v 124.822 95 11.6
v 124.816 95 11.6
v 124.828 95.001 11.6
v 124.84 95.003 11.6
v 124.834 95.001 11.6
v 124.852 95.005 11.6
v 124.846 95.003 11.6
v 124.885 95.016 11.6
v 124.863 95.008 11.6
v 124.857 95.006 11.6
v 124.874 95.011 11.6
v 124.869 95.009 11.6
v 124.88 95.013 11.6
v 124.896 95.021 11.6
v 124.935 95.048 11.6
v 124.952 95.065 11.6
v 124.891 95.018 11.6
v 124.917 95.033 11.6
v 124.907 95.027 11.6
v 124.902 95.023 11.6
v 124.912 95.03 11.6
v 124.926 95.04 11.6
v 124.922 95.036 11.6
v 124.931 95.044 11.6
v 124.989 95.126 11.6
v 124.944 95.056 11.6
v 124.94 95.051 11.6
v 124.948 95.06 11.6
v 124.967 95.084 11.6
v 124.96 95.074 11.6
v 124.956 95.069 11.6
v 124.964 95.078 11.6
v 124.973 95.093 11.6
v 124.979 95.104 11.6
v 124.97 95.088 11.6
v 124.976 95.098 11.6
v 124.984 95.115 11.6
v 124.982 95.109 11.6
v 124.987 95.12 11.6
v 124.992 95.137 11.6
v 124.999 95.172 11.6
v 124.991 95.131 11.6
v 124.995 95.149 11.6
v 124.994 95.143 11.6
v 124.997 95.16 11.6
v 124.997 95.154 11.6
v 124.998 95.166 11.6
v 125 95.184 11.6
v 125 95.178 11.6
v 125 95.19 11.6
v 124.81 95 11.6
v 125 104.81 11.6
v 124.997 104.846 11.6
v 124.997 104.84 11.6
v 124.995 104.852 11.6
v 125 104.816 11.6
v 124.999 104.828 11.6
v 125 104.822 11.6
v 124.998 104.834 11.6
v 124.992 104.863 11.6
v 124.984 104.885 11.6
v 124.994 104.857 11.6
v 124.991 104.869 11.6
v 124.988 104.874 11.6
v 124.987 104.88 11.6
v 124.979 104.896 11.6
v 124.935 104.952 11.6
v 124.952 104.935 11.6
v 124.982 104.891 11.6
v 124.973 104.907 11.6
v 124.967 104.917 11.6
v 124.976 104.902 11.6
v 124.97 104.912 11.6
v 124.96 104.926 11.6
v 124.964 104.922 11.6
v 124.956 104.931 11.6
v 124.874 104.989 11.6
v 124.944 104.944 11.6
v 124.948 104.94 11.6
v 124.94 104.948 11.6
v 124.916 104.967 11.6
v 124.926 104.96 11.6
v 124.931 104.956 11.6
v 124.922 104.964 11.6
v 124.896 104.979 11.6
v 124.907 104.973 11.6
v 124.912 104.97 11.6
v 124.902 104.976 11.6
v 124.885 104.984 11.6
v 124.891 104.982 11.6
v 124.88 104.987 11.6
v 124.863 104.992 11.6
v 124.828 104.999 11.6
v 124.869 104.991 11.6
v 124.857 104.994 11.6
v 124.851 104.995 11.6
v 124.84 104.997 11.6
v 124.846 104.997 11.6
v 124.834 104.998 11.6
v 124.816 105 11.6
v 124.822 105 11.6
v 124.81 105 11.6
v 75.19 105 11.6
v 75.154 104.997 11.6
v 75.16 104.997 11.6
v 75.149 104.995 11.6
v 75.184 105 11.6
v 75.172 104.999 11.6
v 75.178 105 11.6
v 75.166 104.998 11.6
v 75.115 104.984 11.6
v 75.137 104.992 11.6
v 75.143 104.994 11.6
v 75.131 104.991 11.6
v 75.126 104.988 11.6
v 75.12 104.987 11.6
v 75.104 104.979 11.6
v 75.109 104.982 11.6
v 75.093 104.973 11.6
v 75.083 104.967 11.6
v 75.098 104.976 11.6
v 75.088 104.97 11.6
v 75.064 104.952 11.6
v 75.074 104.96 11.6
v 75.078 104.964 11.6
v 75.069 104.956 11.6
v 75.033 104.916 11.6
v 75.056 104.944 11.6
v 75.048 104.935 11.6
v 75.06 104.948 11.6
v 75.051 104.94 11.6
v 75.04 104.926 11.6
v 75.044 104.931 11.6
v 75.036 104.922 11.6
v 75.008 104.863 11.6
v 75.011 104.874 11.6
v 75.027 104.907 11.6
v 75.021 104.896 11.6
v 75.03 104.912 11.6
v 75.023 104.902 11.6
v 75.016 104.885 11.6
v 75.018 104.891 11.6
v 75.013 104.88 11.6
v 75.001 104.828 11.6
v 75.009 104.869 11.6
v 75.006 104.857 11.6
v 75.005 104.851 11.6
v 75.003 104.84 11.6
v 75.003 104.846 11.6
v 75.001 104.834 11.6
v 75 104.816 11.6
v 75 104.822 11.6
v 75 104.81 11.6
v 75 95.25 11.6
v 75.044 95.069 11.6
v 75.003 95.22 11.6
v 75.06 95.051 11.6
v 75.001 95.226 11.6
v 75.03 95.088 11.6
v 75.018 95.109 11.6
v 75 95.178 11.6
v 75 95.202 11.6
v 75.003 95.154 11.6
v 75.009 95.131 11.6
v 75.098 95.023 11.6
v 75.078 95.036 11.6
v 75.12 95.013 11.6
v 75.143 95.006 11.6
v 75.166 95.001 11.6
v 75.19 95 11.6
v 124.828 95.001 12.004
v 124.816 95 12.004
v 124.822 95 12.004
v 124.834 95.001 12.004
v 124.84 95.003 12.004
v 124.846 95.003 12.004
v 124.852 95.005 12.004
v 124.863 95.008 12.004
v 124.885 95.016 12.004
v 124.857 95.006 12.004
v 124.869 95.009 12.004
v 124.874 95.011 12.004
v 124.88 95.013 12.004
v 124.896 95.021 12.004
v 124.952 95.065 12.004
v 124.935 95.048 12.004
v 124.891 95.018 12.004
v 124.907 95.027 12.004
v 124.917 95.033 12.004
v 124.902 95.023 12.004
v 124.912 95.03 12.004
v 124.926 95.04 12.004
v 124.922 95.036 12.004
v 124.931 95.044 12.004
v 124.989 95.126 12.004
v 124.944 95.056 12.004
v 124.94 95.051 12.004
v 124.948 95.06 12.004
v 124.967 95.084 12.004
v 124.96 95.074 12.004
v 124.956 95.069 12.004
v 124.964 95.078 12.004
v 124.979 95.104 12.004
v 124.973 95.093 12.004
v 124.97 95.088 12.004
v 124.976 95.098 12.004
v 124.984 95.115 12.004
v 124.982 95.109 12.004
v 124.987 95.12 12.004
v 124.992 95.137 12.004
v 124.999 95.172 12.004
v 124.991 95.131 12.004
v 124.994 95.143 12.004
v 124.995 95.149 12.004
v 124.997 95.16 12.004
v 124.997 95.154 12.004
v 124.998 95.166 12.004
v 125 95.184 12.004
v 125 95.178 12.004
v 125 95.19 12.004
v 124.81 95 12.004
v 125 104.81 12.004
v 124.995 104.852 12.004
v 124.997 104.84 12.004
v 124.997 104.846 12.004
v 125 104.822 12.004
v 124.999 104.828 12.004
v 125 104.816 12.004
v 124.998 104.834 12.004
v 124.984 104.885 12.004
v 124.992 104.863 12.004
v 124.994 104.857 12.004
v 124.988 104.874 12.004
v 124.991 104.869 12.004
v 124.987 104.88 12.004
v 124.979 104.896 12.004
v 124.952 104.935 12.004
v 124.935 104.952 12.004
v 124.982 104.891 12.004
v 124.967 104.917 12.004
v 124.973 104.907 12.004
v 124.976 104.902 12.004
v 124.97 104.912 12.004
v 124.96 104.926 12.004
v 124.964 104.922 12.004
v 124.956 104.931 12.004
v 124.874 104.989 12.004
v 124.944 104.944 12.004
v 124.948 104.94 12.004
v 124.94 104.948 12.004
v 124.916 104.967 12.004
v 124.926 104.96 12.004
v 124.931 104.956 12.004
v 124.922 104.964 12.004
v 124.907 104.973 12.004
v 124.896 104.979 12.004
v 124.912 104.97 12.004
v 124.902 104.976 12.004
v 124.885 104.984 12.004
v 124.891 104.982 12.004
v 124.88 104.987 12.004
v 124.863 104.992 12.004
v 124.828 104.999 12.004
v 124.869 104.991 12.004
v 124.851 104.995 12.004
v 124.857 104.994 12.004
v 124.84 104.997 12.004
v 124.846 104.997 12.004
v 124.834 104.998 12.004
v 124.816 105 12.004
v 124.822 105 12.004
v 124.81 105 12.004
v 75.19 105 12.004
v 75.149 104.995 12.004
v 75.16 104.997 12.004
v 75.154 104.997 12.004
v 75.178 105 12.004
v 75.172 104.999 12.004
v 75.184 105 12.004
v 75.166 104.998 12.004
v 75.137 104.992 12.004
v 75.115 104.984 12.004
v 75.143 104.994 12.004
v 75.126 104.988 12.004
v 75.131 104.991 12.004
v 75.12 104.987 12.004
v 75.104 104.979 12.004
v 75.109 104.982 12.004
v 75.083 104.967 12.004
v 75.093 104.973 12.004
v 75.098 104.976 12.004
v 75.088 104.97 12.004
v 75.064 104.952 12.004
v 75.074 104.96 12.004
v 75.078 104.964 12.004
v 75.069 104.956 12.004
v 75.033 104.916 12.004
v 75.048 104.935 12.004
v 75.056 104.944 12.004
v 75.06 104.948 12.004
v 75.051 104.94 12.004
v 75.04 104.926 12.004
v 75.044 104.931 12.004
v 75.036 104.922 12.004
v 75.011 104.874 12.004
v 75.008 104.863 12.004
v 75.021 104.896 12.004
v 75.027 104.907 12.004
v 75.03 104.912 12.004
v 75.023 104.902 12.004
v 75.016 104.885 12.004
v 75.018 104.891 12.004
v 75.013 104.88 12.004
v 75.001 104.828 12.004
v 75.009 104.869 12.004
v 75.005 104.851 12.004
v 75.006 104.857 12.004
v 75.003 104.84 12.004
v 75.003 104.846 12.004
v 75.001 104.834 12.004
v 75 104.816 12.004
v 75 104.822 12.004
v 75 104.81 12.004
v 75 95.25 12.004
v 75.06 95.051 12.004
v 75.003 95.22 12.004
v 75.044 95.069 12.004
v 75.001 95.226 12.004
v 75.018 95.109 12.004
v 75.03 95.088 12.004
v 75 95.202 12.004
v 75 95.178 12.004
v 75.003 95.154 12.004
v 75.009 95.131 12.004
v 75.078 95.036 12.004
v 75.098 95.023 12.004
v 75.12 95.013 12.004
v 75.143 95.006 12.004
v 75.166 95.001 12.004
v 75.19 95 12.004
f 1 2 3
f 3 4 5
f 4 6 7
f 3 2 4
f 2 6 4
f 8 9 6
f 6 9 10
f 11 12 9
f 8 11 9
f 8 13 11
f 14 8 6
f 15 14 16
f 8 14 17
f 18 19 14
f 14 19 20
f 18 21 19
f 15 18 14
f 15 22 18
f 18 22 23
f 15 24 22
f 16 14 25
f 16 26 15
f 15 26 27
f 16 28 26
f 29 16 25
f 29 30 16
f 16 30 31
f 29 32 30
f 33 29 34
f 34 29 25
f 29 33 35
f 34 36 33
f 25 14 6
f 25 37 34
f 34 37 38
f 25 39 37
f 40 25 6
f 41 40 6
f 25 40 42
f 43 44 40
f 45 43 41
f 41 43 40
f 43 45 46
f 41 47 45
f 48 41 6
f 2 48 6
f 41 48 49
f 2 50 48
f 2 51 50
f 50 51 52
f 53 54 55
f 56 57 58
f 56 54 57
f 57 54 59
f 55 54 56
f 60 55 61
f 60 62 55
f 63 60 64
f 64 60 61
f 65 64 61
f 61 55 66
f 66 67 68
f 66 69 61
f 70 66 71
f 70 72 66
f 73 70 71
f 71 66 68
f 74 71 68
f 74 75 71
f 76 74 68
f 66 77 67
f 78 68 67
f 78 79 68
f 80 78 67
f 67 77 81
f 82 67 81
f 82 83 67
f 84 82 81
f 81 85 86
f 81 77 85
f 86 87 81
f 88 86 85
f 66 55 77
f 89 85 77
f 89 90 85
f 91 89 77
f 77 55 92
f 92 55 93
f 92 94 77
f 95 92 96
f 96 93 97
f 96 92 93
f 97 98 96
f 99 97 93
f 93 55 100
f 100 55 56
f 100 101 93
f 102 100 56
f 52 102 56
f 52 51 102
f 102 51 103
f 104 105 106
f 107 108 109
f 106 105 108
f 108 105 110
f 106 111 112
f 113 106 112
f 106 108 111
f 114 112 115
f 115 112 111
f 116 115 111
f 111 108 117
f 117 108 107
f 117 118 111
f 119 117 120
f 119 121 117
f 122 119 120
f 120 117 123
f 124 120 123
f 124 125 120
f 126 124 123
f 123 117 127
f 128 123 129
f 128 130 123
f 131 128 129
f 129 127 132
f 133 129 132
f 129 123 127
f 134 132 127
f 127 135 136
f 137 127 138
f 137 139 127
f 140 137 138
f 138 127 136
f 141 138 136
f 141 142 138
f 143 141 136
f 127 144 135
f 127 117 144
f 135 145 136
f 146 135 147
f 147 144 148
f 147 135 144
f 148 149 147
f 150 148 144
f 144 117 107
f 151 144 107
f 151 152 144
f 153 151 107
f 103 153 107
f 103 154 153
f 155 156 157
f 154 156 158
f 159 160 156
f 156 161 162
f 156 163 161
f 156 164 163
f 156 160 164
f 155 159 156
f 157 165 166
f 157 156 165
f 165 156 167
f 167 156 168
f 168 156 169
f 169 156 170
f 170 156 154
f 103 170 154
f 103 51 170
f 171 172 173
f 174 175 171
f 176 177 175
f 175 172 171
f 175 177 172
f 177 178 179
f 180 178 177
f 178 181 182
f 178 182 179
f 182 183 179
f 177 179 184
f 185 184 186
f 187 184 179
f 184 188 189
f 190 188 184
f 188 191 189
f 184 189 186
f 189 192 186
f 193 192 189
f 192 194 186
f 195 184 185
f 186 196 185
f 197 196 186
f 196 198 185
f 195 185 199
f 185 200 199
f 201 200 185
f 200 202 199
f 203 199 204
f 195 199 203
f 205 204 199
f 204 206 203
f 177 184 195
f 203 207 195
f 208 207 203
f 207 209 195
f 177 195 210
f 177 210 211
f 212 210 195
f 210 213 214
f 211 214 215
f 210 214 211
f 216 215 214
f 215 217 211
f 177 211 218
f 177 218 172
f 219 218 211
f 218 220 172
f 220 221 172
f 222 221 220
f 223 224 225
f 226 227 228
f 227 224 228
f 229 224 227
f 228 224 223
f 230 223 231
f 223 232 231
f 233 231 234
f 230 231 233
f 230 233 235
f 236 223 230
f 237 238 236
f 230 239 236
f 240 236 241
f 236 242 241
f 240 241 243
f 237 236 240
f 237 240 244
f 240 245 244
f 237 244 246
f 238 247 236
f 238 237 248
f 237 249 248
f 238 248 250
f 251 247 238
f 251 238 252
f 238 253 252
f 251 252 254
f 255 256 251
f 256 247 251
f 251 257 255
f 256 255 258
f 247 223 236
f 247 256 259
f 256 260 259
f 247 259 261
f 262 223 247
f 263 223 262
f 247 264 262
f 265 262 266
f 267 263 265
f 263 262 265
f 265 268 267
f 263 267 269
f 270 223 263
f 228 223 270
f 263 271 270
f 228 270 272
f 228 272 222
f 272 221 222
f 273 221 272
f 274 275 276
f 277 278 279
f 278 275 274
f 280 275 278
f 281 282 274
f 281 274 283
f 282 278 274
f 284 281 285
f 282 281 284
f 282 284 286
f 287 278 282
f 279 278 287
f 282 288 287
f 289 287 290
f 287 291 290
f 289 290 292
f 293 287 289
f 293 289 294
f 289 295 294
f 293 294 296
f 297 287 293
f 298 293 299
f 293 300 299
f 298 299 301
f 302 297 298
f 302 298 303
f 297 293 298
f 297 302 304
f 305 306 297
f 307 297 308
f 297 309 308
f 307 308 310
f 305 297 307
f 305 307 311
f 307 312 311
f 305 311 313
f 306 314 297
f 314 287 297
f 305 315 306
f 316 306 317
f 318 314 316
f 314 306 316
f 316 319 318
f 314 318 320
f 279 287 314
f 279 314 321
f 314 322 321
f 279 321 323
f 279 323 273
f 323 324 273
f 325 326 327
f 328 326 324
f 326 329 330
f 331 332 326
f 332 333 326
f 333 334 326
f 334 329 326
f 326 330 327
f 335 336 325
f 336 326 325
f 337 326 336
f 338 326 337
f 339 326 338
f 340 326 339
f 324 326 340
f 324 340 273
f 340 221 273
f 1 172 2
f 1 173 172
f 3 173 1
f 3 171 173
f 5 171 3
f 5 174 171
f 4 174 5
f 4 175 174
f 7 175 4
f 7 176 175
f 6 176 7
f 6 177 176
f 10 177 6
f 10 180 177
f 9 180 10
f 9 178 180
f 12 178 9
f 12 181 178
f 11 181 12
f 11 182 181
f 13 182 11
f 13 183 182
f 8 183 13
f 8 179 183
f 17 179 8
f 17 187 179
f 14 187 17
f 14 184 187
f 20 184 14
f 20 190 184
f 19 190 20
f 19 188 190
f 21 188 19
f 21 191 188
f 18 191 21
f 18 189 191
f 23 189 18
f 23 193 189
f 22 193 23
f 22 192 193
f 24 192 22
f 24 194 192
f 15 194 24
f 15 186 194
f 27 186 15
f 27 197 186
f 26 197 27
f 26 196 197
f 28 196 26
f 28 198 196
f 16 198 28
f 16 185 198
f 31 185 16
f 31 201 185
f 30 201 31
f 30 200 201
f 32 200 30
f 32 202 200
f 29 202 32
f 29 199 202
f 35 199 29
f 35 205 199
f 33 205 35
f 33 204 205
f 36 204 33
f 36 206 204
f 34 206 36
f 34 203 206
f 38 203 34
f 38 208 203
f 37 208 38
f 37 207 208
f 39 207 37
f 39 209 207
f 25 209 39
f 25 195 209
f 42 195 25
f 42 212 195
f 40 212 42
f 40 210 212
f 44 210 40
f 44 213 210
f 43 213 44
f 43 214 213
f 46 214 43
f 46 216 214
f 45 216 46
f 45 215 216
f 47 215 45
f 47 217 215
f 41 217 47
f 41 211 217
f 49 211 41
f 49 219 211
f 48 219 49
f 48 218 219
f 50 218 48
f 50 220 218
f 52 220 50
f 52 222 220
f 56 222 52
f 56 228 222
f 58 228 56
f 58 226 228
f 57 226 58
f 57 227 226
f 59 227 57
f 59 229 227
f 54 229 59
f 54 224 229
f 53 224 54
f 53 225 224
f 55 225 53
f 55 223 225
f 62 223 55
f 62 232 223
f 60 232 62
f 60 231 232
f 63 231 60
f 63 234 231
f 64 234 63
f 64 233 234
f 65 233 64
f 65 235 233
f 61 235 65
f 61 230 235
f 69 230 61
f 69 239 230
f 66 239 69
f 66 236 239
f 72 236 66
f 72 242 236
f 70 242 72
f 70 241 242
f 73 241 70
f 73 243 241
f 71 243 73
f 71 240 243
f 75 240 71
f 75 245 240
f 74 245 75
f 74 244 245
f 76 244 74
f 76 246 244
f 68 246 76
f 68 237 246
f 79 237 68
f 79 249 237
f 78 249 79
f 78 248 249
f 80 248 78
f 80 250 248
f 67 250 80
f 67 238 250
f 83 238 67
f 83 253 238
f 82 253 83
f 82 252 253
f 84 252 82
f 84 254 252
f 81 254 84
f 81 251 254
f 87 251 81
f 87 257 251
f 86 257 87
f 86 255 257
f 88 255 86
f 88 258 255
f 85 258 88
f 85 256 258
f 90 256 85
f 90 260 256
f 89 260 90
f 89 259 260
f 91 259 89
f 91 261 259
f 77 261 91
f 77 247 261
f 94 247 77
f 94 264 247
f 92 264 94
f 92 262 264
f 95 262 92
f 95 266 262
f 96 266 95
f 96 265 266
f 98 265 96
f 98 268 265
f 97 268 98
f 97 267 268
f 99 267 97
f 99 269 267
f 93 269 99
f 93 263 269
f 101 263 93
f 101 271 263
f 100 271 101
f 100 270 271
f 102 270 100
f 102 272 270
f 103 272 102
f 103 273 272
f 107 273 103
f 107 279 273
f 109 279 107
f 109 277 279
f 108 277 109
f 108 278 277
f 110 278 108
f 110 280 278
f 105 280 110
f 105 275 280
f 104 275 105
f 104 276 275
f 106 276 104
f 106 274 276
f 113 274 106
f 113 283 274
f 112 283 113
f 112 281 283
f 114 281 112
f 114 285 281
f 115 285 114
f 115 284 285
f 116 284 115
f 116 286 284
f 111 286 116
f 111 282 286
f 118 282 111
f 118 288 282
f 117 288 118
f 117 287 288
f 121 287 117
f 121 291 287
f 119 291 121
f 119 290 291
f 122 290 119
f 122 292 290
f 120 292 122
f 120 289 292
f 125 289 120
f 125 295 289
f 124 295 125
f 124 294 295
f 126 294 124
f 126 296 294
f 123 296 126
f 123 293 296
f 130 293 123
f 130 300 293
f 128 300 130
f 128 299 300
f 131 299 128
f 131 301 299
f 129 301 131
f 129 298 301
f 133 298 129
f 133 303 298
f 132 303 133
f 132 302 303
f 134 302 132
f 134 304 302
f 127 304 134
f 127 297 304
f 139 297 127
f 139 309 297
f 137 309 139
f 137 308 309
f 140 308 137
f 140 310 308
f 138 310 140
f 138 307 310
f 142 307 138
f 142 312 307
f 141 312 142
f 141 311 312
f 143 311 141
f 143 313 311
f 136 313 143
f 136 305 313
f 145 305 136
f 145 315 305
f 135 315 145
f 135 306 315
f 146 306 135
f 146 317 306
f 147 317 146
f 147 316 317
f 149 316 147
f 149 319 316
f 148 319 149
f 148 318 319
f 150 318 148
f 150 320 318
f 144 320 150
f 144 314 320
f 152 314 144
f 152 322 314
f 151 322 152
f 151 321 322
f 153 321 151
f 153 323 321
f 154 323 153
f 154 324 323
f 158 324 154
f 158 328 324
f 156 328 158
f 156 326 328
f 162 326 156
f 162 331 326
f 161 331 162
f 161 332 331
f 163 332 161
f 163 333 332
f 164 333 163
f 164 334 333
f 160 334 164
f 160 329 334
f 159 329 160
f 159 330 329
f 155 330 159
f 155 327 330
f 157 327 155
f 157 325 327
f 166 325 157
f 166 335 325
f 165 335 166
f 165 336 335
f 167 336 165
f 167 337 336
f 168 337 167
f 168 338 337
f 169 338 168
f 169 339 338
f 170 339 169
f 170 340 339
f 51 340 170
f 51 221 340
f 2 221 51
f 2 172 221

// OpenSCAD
module drawBasicShape(x1, y1, x2, y2, width)
{
	length = sqrt((x1-x2)*(x1-x2) + (y1-y2)*(y1-y2));
	if (width!=0.0) {
		square(size = [width, length], center = false);
		translate([width/2.0, 0, 0]) circle(d=width);
		translate([width/2.0, length, 0]) circle(d=width);
	}
}

module translateAndRotate(x1, y1, x2, y2, width)
{
	if (width != 0.0) {
		angle = atan((y2-y1)/(x2-x1)) +270;
		if (x2>=x1) {
			translate([x1, y1, 0.0]) rotate([0.0, 0.0, angle]) translate([-width/2.0, 0.0, 0.0]) scale([1.0, 1.0, 1.0]) drawBasicShape(x1, y1, x2, y2, width);
		}
		else {
			translate([x1, y1, 0.0]) rotate([0.0, 0.0, angle+180]) translate([-width/2.0, 0.0, 0.0]) scale([1.0, 1.0, 1.0]) drawBasicShape(x1, y1, x2, y2, width);		}
	}
}

$fn=50;

points28 = [
[75.77800000, 95.77800000, 0.00000000],
[124.22200000, 95.77800000, 0.37999672],
[124.22200000, 104.22200000, 0.37997788],
[75.77800000, 104.22200000, 0.37999548],
[75.77800000, 95.83800000, 0.37998140],
[75.48400000, 95.48400000, 0.00000000],
[124.51600000, 95.48400000, 0.37999746],
[124.51600000, 104.51600000, 0.37998977],
[75.48400000, 104.51600000, 0.37999868],
[75.48400000, 95.54400000, 0.37998644],
[75.19000000, 95.19000000, 0.00000000],
[124.81000000, 95.19000000, 0.38000060],
[124.81000000, 104.81000000, 0.38000021],
[75.19000000, 104.81000000, 0.37999939],
[75.19000000, 95.25000000, 0.37999715],
[75.53600000, 95.39000000, 0.00000000],
[75.94600000, 103.88900000, 0.00000000],
[76.11100000, 104.05400000, 0.37961375],
[76.52800000, 104.05400000, 0.38015610],
[75.94600000, 103.47200000, 0.37989934],
[75.94600000, 103.05500000, 0.38001190],
[76.94500000, 104.05400000, 0.37994651],
[77.36200000, 104.05400000, 0.38001190],
[75.94600000, 102.63800000, 0.37999592],
[75.94600000, 102.22100000, 0.38001190],
[77.77900000, 104.05400000, 0.38002285],
[78.19600000, 104.05400000, 0.38001190],
[75.94600000, 101.80400000, 0.38000201],
[75.94600000, 101.38700000, 0.38001190],
[78.61300000, 104.05400000, 0.38001957],
[79.03000000, 104.05400000, 0.38001190],
[75.94600000, 100.97000000, 0.38001859],
[75.94600000, 100.55300000, 0.38015610],
[79.44700000, 104.05400000, 0.38001785],
[79.86400000, 104.05400000, 0.38001190],
[75.94600000, 100.13600000, 0.38002811],
[75.94600000, 99.71900000, 0.38001190],
[80.28100000, 104.05400000, 0.38002660],
[80.69800000, 104.05400000, 0.38015610],
[75.94600000, 99.30200000, 0.38002534],
[75.94600000, 98.88500000, 0.38001190],
[81.11500000, 104.05400000, 0.38003252],
[81.53300000, 104.05400000, 0.37930814],
[75.94600000, 98.46700000, 0.37997836],
[75.94600000, 98.05000000, 0.38001190],
[81.95000000, 104.05400000, 0.37998780],
[82.36700000, 104.05400000, 0.38001190],
[75.94600000, 97.63300000, 0.37998939],
[75.94600000, 97.21600000, 0.38001190],
[82.78400000, 104.05400000, 0.37999079],
[83.20100000, 104.05400000, 0.38001190],
[75.94600000, 96.79900000, 0.37999203],
[75.94600000, 96.38200000, 0.38015610],
[83.61800000, 104.05400000, 0.37999314],
[84.03500000, 104.05400000, 0.38015610],
[75.95600000, 95.97600000, 0.37999749],
[76.34400000, 95.94600000, 0.37973456],
[84.45200000, 104.05400000, 0.38000229],
[84.86900000, 104.05400000, 0.38001190],
[76.76100000, 95.94600000, 0.38000229],
[77.17800000, 95.94600000, 0.38015610],
[85.28600000, 104.05400000, 0.38000229],
[85.70300000, 104.05400000, 0.38001190],
[77.59500000, 95.94600000, 0.38000754],
[78.01200000, 95.94600000, 0.38001190],
[86.12000000, 104.05400000, 0.38000229],
[86.53700000, 104.05400000, 0.38001190],
[78.42900000, 95.94600000, 0.38000754],
[78.84600000, 95.94600000, 0.38001190],
[86.95400000, 104.05400000, 0.38000229],
[87.37100000, 104.05400000, 0.38015610],
[79.26300000, 95.94600000, 0.38000229],
[79.68000000, 95.94600000, 0.38001190],
[87.78900000, 104.05400000, 0.37998940],
[88.20600000, 104.05400000, 0.38001190],
[80.09700000, 95.94600000, 0.37998415],
[80.51500000, 95.94600000, 0.37930814],
[88.62300000, 104.05400000, 0.38000754],
[89.04000000, 104.05400000, 0.38001190],
[80.93200000, 95.94600000, 0.38000229],
[81.34900000, 95.94600000, 0.38015610],
[89.45700000, 104.05400000, 0.38000229],
[89.87400000, 104.05400000, 0.38001190],
[81.76600000, 95.94600000, 0.38000754],
[82.18300000, 95.94600000, 0.38001190],
[90.29100000, 104.05400000, 0.38000229],
[90.70800000, 104.05400000, 0.38001190],
[82.60000000, 95.94600000, 0.38000754],
[83.01700000, 95.94600000, 0.38001190],
[91.12500000, 104.05400000, 0.38000229],
[91.54200000, 104.05400000, 0.38015610],
[83.43400000, 95.94600000, 0.38000229],
[83.85100000, 95.94600000, 0.38001190],
[91.95900000, 104.05400000, 0.38000754],
[92.37600000, 104.05400000, 0.38001190],
[84.26800000, 95.94600000, 0.38000229],
[84.68500000, 95.94600000, 0.38001190],
[92.79300000, 104.05400000, 0.38000754],
[93.21000000, 104.05400000, 0.38001190],
[85.10200000, 95.94600000, 0.38000229],
[85.51900000, 95.94600000, 0.38015610],
[93.62700000, 104.05400000, 0.38000229],
[94.04400000, 104.05400000, 0.38001190],
[85.93600000, 95.94600000, 0.38000754],
[86.35300000, 95.94600000, 0.38001190],
[94.46200000, 104.05400000, 0.37998415],
[94.87900000, 104.05400000, 0.38001190],
[86.77000000, 95.94600000, 0.37998940],
[87.18800000, 95.94600000, 0.37930814],
[95.29600000, 104.05400000, 0.38000229],
[95.71300000, 104.05400000, 0.38015610],
[87.60500000, 95.94600000, 0.38000229],
[88.02200000, 95.94600000, 0.38001190],
[96.13000000, 104.05400000, 0.38000754],
[96.54700000, 104.05400000, 0.38001190],
[88.43900000, 95.94600000, 0.38000229],
[88.85600000, 95.94600000, 0.38001190],
[96.96400000, 104.05400000, 0.38000754],
[97.38100000, 104.05400000, 0.38001190],
[89.27300000, 95.94600000, 0.38000229],
[89.69000000, 95.94600000, 0.38015610],
[97.79800000, 104.05400000, 0.38000229],
[98.21500000, 104.05400000, 0.38001190],
[90.10700000, 95.94600000, 0.38000754],
[90.52400000, 95.94600000, 0.38001190],
[98.63200000, 104.05400000, 0.38000229],
[99.04900000, 104.05400000, 0.38001190],
[90.94100000, 95.94600000, 0.38000754],
[91.35800000, 95.94600000, 0.38001190],
[99.46600000, 104.05400000, 0.38000229],
[99.88300000, 104.05400000, 0.38015610],
[91.77500000, 95.94600000, 0.38000229],
[92.19200000, 95.94600000, 0.38001190],
[100.30000000, 104.05400000, 0.38000754],
[100.71800000, 104.05400000, 0.37930814],
[92.60900000, 95.94600000, 0.37998415],
[93.02600000, 95.94600000, 0.38001190],
[101.13500000, 104.05400000, 0.37998940],
[101.55200000, 104.05400000, 0.38001190],
[93.44400000, 95.94600000, 0.38000229],
[93.86100000, 95.94600000, 0.38015610],
[101.96900000, 104.05400000, 0.38000229],
[102.38600000, 104.05400000, 0.38001190],
[94.27800000, 95.94600000, 0.38000229],
[94.69500000, 95.94600000, 0.38015610],
[102.80300000, 104.05400000, 0.38000229],
[103.22000000, 104.05400000, 0.38001190],
[95.11200000, 95.94600000, 0.38000754],
[95.52900000, 95.94600000, 0.38001190],
[103.63700000, 104.05400000, 0.38000229],
[104.05400000, 104.05400000, 0.38001190],
[95.94600000, 95.94600000, 0.38000754],
[96.36300000, 95.94600000, 0.38001190],
[104.47100000, 104.05400000, 0.38000229],
[104.88800000, 104.05400000, 0.38015610],
[96.78000000, 95.94600000, 0.38000229],
[97.19700000, 95.94600000, 0.38001190],
[105.30500000, 104.05400000, 0.38000754],
[105.72200000, 104.05400000, 0.38001190],
[97.61400000, 95.94600000, 0.38000229],
[98.03100000, 95.94600000, 0.38001190],
[106.13900000, 104.05400000, 0.38000754],
[106.55600000, 104.05400000, 0.38001190],
[98.44800000, 95.94600000, 0.38000229],
[98.86500000, 95.94600000, 0.38015610],
[106.97300000, 104.05400000, 0.38000229],
[107.39100000, 104.05400000, 0.37930814],
[99.28200000, 95.94600000, 0.37998940],
[99.69900000, 95.94600000, 0.38001190],
[107.80800000, 104.05400000, 0.37998415],
[108.22500000, 104.05400000, 0.38001190],
[100.11700000, 95.94600000, 0.38000754],
[100.53400000, 95.94600000, 0.38001190],
[108.64200000, 104.05400000, 0.38000229],
[109.05900000, 104.05400000, 0.38015610],
[100.95100000, 95.94600000, 0.38000229],
[101.36800000, 95.94600000, 0.38001190],
[109.47600000, 104.05400000, 0.38000754],
[109.89300000, 104.05400000, 0.38001190],
[101.78500000, 95.94600000, 0.38000229],
[102.20200000, 95.94600000, 0.38001190],
[110.31000000, 104.05400000, 0.38000754],
[110.72700000, 104.05400000, 0.38001190],
[102.61900000, 95.94600000, 0.38000229],
[103.03600000, 95.94600000, 0.38015610],
[111.14400000, 104.05400000, 0.38000229],
[111.56100000, 104.05400000, 0.38001190],
[103.45300000, 95.94600000, 0.38000754],
[103.87000000, 95.94600000, 0.38001190],
[111.97800000, 104.05400000, 0.38000229],
[112.39500000, 104.05400000, 0.38001190],
[104.28700000, 95.94600000, 0.38000754],
[104.70400000, 95.94600000, 0.38001190],
[112.81200000, 104.05400000, 0.38000229],
[113.22900000, 104.05400000, 0.38015610],
[105.12100000, 95.94600000, 0.38000229],
[105.53800000, 95.94600000, 0.38001190],
[113.64700000, 104.05400000, 0.37998415],
[114.06400000, 104.05400000, 0.38015610],
[105.95500000, 95.94600000, 0.37998415],
[106.37300000, 95.94600000, 0.37930814],
[114.48100000, 104.05400000, 0.38000754],
[114.89800000, 104.05400000, 0.38001190],
[106.79000000, 95.94600000, 0.38000229],
[107.20700000, 95.94600000, 0.38015610],
[115.31500000, 104.05400000, 0.38000229],
[115.73200000, 104.05400000, 0.38001190],
[107.62400000, 95.94600000, 0.38000229],
[108.04100000, 95.94600000, 0.38015610],
[116.14900000, 104.05400000, 0.38000229],
[116.56600000, 104.05400000, 0.38001190],
[108.45800000, 95.94600000, 0.38000754],
[108.87500000, 95.94600000, 0.38001190],
[116.98300000, 104.05400000, 0.38000229],
[117.40000000, 104.05400000, 0.38001190],
[109.29200000, 95.94600000, 0.38000754],
[109.70900000, 95.94600000, 0.38001190],
[117.81700000, 104.05400000, 0.38000229],
[118.23400000, 104.05400000, 0.38015610],
[110.12600000, 95.94600000, 0.38000229],
[110.54300000, 95.94600000, 0.38001190],
[118.65100000, 104.05400000, 0.38000754],
[119.06800000, 104.05400000, 0.38001190],
[110.96000000, 95.94600000, 0.38000229],
[111.37700000, 95.94600000, 0.38001190],
[119.48500000, 104.05400000, 0.38000754],
[119.90200000, 104.05400000, 0.38001190],
[111.79400000, 95.94600000, 0.38000229],
[112.21100000, 95.94600000, 0.38015610],
[120.32000000, 104.05400000, 0.37998415],
[120.73700000, 104.05400000, 0.38001190],
[112.62900000, 95.94600000, 0.38000754],
[113.04600000, 95.94600000, 0.38001190],
[121.15400000, 104.05400000, 0.38000229],
[121.57100000, 104.05400000, 0.38001190],
[113.46300000, 95.94600000, 0.38000754],
[113.88000000, 95.94600000, 0.38001190],
[121.98800000, 104.05400000, 0.38000229],
[122.40500000, 104.05400000, 0.38015610],
[114.29700000, 95.94600000, 0.38000229],
[114.71400000, 95.94600000, 0.38001190],
[122.82200000, 104.05400000, 0.38000229],
[123.23900000, 104.05400000, 0.38015610],
[115.13100000, 95.94600000, 0.38000229],
[115.54800000, 95.94600000, 0.38001190],
[123.65600000, 104.05400000, 0.38000754],
[124.04400000, 104.02500000, 0.37963728],
[115.96500000, 95.94600000, 0.37998455],
[116.38200000, 95.94600000, 0.38001190],
[124.05400000, 103.61800000, 0.37999868],
[124.05400000, 103.20100000, 0.38001190],
[116.79900000, 95.94600000, 0.37999789],
[117.21600000, 95.94600000, 0.38001190],
[124.05400000, 102.78400000, 0.37999701],
[124.05400000, 102.36700000, 0.38001190],
[117.63300000, 95.94600000, 0.37998939],
[118.05000000, 95.94600000, 0.38001190],
[124.05400000, 101.95000000, 0.37998780],
[124.05400000, 101.53300000, 0.38001190],
[118.46700000, 95.94600000, 0.37997836],
[118.88400000, 95.94600000, 0.38015610],
[124.05400000, 101.11600000, 0.37997562],
[124.05400000, 100.69800000, 0.37930814],
[119.30200000, 95.94600000, 0.38003429],
[119.71900000, 95.94600000, 0.38001190],
[124.05400000, 100.28100000, 0.38002660],
[124.05400000, 99.86400000, 0.38015610],
[120.13600000, 95.94600000, 0.38002811],
[120.55300000, 95.94600000, 0.38001190],
[124.05400000, 99.44700000, 0.38002999],
[124.05400000, 99.03000000, 0.38001190],
[120.97000000, 95.94600000, 0.38001859],
[121.38700000, 95.94600000, 0.38015610],
[124.05400000, 98.61300000, 0.38001957],
[124.05400000, 98.19600000, 0.38001190],
[121.80400000, 95.94600000, 0.38002091],
[122.22100000, 95.94600000, 0.38001190],
[124.05400000, 97.77900000, 0.37999966],
[124.05400000, 97.36200000, 0.38015610],
[122.63800000, 95.94600000, 0.37999592],
[123.05500000, 95.94600000, 0.38001190],
[124.05400000, 96.94500000, 0.37998907],
[124.05400000, 96.52800000, 0.38001190],
[123.47200000, 95.94600000, 0.37989934],
[123.88900000, 95.94600000, 0.38015610],
[124.05400000, 96.11100000, 0.37961375],
];

translate([0.0, 0.0, 11.60000000]) {
	linear_extrude(height = 0.40400000, center = false, convexity = 10, twist = 0) {
		union() {
			for( i=[0:len(points28)-2] ){ 
				x1 = points28[i][0];
				y1 = points28[i][1];
				x2 = points28[i+1][0];
				y2 = points28[i+1][1];
				width = points28[i+1][2];
				translateAndRotate(x1, y1, x2, y2, width);
			}
		}
	}
}
